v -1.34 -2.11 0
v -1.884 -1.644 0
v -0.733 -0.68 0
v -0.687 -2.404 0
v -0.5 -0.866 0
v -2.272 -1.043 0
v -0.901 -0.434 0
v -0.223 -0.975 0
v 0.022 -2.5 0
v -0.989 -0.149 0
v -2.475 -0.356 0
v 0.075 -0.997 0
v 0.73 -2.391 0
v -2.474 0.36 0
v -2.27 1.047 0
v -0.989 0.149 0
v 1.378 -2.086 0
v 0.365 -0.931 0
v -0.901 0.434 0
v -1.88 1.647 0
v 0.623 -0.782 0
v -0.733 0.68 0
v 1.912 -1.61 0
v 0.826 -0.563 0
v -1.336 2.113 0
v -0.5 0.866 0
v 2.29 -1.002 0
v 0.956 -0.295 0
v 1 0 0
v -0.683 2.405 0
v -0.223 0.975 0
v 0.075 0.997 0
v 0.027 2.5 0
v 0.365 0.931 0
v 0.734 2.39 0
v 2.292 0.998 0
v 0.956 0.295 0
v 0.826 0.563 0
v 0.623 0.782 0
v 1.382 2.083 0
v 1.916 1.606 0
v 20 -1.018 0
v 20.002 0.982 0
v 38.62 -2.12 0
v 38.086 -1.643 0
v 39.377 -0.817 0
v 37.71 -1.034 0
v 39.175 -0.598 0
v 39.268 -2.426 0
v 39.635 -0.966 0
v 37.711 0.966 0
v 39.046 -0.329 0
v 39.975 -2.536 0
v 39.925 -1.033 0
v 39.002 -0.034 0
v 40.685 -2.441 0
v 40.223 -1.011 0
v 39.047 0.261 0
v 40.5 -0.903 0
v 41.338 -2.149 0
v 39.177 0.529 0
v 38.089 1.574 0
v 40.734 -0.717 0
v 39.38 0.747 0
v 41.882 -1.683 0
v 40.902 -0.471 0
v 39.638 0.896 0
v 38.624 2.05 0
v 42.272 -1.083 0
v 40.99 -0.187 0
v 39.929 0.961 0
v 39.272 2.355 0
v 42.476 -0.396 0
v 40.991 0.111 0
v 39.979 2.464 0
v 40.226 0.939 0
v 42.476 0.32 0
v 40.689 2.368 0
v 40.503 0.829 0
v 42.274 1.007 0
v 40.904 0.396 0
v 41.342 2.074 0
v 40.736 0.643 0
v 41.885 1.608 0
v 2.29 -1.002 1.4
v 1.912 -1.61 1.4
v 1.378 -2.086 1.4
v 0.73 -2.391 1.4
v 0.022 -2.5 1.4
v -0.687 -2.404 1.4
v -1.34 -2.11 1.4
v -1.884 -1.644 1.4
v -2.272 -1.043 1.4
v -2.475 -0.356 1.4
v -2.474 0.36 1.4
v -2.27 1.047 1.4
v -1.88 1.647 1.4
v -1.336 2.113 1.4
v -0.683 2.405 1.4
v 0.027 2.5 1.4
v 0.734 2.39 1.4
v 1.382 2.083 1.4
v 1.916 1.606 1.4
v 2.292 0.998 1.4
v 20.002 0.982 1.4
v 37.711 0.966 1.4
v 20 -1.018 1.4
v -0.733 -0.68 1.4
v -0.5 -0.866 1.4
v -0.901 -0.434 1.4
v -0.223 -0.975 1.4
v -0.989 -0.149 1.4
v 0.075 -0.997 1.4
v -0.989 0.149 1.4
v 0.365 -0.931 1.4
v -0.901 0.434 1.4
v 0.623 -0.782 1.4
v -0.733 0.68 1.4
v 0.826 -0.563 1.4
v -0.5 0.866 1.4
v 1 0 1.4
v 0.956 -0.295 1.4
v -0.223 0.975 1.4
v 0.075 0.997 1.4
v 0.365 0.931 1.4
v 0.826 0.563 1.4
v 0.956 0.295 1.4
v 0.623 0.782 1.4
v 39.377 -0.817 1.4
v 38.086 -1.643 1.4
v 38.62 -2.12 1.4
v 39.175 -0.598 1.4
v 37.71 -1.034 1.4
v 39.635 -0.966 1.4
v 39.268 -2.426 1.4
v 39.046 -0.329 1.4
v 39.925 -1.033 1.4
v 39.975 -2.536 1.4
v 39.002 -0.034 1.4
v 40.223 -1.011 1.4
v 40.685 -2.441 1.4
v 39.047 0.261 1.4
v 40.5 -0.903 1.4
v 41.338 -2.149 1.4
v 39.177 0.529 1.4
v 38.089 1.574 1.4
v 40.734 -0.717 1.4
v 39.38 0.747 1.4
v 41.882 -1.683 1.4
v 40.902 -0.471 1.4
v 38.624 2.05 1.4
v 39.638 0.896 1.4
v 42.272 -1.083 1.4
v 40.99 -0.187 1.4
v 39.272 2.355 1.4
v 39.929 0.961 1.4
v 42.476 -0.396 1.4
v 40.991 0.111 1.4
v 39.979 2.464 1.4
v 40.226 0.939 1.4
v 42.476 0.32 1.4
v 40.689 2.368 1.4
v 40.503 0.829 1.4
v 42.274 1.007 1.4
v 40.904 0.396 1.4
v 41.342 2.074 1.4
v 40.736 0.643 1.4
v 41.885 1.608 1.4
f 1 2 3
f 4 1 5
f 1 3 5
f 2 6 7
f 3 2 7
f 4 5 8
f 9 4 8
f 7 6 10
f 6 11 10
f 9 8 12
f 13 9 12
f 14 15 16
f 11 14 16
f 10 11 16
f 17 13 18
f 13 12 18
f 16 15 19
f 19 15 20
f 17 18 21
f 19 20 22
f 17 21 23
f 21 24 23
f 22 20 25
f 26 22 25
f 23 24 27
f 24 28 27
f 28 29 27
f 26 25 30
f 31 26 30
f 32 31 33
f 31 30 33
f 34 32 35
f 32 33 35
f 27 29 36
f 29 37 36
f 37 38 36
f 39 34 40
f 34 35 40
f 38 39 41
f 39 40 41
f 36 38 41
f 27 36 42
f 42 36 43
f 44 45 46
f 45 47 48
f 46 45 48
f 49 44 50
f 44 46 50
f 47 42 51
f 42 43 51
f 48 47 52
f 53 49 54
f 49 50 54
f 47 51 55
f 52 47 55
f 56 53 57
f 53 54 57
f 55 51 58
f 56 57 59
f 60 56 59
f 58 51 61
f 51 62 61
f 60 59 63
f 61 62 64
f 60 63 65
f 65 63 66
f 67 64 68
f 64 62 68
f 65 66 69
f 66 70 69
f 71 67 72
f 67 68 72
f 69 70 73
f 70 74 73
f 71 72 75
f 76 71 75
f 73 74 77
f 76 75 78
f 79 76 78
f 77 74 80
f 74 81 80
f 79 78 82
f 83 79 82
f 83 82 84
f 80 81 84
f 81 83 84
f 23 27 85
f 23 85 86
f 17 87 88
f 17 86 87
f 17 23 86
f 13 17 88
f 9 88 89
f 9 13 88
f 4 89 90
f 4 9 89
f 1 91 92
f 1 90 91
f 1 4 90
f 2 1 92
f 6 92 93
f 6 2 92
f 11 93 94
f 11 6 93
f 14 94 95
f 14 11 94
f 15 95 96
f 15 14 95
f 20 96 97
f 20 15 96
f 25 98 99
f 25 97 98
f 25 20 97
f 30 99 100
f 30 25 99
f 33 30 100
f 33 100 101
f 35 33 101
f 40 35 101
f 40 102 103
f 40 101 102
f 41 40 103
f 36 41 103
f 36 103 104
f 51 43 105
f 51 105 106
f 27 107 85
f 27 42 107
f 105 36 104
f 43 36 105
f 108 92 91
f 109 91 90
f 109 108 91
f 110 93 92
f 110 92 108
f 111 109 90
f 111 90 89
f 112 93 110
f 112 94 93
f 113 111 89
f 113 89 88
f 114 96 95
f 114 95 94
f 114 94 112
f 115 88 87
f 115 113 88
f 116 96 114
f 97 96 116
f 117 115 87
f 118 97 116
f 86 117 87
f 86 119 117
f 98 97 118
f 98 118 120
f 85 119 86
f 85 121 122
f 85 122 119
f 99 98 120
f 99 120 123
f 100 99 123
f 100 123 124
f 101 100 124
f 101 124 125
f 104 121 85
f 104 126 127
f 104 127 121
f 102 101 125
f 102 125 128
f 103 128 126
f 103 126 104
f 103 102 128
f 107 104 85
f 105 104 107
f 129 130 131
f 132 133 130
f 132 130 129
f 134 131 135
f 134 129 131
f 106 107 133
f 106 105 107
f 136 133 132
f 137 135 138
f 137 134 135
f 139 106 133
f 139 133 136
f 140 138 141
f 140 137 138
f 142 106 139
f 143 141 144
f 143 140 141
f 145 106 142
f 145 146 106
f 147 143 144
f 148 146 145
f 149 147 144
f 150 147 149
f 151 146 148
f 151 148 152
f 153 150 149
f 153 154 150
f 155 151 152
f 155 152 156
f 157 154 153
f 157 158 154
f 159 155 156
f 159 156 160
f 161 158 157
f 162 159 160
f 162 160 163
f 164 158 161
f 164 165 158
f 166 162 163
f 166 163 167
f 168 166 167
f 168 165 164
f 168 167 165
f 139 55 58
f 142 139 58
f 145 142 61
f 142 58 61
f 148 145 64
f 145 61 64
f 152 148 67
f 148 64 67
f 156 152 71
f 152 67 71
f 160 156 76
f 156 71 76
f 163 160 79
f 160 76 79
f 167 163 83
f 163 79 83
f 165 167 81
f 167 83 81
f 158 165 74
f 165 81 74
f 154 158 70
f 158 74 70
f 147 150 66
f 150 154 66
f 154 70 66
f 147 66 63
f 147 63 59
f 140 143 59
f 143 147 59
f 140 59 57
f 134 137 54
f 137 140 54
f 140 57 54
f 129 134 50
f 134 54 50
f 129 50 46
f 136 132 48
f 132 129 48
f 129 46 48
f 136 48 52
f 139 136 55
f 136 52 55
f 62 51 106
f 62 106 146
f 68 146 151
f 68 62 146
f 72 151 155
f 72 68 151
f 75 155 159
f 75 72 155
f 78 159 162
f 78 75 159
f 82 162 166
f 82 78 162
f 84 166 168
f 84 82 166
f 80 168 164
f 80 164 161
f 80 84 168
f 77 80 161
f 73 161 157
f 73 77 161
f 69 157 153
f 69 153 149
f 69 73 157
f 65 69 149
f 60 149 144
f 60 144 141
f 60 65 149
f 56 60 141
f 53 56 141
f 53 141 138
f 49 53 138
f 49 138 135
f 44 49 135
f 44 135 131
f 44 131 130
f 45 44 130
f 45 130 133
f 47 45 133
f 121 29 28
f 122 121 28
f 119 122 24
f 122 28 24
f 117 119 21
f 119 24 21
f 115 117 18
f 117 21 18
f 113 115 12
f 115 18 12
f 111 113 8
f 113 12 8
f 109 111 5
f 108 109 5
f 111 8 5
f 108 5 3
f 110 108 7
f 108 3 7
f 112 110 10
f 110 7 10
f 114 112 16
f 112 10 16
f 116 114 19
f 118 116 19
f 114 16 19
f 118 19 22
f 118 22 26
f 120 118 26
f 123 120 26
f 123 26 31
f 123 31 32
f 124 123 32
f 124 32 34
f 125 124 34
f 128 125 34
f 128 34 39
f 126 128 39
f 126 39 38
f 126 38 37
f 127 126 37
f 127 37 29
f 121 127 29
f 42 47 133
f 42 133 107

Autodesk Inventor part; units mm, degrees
ref_plane "YZ Plane" through (0, 0, 0) normal (1, 0, 0) x (0, 1, 0)
ref_plane "XZ Plane" through (0, 0, 0) normal (0, 1, 0) x (-1, 0, 0)
ref_plane "XY Plane" through (0, 0, 0) normal (0, 0, 1) x (1, 0, 0)
sketch "Sketch1" plane through (0, 0, 0) normal (0, 0, 1) x (1, 0, 0)
  circle A0 centre (0, 0) radius 1
  circle A1 centre (47.0377, -0.0423) radius 1
  arc A2 (2.2923, 0.9976) -> (2.2904, -1.0021) centre (0, 0) ccw
  arc A3 (44.7455, -1.0402) -> (44.7473, 0.9598) centre (47.0377, -0.0423) ccw
  line L0 (0, -2) -> (0, 1)
  line L1 (48.4179, 2.0423) -> (48.671, 2.0423)
  line L2 (48.671, -1.9577) -> (48.6442, -1.9577)
  line L3 (48.671, 2.0423) -> (48.671, 1.8505)
  line L4 (48.671, -1.935) -> (48.671, -1.9577)
  line L5 (0, 1) -> (0.0018, 1)
  line L6 (2.2923, 0.9976) -> (44.7473, 0.9598)
  line L7 (47.0404, -1.0422) -> (47.0368, -1.0423)
  line L8 (44.7455, -1.0402) -> (2.2904, -1.0021)
  dimension "d0" = 2
  dimension "d1" = 2
  dimension "d2" = 5
  dimension "d3" = 5
  dimension "d5" = 4
extrude "Extrusion1" add sketch "Sketch1" along normal blind 1.4 contours L6 A3 L8 A2
sketch "Sketch2" plane through (0, 0, 0) normal (0, 0, -1) x (-1, 0, 0)
  point P0 (0, 0)
sketch "Sketch3" plane through (44.7455, -1.0402, 0) normal (-0.0008981, -0.9999996, 0) x (0.9999996, -0.0008981, 0)
  point P0 (-44.7464, 0)
sketch "Sketch4" plane through (44.7455, -1.0402, 0) normal (-0.0008981, -0.9999996, 0) x (0.9999996, -0.0008981, 0)
  line L0 (-44.7455, 0) -> (-24.7455, 0)
  line L1 (-24.7455, 0) -> (-24.7455, 4.8561)
  line L2 (-24.7455, -1.4779) -> (7.1983, -1.4779)
  line L3 (7.1983, -1.4779) -> (7.1983, 5.595)
  line L4 (7.1983, 5.595) -> (-24.7455, 5.595)
  line L5 (-24.7455, 5.595) -> (-24.7455, -1.4779)
  point P0 (-44.7464, 0)
  dimension "d8" = 20
extrude "Extrusion2" cut sketch "Sketch4" along normal mid plane 10
mirror "Mirror1" about plane through (20, -1.018, 5.595) normal (0.9999996, -0.0008981, 0)
properties part number "Restrain_Pin_Pinky_1"
